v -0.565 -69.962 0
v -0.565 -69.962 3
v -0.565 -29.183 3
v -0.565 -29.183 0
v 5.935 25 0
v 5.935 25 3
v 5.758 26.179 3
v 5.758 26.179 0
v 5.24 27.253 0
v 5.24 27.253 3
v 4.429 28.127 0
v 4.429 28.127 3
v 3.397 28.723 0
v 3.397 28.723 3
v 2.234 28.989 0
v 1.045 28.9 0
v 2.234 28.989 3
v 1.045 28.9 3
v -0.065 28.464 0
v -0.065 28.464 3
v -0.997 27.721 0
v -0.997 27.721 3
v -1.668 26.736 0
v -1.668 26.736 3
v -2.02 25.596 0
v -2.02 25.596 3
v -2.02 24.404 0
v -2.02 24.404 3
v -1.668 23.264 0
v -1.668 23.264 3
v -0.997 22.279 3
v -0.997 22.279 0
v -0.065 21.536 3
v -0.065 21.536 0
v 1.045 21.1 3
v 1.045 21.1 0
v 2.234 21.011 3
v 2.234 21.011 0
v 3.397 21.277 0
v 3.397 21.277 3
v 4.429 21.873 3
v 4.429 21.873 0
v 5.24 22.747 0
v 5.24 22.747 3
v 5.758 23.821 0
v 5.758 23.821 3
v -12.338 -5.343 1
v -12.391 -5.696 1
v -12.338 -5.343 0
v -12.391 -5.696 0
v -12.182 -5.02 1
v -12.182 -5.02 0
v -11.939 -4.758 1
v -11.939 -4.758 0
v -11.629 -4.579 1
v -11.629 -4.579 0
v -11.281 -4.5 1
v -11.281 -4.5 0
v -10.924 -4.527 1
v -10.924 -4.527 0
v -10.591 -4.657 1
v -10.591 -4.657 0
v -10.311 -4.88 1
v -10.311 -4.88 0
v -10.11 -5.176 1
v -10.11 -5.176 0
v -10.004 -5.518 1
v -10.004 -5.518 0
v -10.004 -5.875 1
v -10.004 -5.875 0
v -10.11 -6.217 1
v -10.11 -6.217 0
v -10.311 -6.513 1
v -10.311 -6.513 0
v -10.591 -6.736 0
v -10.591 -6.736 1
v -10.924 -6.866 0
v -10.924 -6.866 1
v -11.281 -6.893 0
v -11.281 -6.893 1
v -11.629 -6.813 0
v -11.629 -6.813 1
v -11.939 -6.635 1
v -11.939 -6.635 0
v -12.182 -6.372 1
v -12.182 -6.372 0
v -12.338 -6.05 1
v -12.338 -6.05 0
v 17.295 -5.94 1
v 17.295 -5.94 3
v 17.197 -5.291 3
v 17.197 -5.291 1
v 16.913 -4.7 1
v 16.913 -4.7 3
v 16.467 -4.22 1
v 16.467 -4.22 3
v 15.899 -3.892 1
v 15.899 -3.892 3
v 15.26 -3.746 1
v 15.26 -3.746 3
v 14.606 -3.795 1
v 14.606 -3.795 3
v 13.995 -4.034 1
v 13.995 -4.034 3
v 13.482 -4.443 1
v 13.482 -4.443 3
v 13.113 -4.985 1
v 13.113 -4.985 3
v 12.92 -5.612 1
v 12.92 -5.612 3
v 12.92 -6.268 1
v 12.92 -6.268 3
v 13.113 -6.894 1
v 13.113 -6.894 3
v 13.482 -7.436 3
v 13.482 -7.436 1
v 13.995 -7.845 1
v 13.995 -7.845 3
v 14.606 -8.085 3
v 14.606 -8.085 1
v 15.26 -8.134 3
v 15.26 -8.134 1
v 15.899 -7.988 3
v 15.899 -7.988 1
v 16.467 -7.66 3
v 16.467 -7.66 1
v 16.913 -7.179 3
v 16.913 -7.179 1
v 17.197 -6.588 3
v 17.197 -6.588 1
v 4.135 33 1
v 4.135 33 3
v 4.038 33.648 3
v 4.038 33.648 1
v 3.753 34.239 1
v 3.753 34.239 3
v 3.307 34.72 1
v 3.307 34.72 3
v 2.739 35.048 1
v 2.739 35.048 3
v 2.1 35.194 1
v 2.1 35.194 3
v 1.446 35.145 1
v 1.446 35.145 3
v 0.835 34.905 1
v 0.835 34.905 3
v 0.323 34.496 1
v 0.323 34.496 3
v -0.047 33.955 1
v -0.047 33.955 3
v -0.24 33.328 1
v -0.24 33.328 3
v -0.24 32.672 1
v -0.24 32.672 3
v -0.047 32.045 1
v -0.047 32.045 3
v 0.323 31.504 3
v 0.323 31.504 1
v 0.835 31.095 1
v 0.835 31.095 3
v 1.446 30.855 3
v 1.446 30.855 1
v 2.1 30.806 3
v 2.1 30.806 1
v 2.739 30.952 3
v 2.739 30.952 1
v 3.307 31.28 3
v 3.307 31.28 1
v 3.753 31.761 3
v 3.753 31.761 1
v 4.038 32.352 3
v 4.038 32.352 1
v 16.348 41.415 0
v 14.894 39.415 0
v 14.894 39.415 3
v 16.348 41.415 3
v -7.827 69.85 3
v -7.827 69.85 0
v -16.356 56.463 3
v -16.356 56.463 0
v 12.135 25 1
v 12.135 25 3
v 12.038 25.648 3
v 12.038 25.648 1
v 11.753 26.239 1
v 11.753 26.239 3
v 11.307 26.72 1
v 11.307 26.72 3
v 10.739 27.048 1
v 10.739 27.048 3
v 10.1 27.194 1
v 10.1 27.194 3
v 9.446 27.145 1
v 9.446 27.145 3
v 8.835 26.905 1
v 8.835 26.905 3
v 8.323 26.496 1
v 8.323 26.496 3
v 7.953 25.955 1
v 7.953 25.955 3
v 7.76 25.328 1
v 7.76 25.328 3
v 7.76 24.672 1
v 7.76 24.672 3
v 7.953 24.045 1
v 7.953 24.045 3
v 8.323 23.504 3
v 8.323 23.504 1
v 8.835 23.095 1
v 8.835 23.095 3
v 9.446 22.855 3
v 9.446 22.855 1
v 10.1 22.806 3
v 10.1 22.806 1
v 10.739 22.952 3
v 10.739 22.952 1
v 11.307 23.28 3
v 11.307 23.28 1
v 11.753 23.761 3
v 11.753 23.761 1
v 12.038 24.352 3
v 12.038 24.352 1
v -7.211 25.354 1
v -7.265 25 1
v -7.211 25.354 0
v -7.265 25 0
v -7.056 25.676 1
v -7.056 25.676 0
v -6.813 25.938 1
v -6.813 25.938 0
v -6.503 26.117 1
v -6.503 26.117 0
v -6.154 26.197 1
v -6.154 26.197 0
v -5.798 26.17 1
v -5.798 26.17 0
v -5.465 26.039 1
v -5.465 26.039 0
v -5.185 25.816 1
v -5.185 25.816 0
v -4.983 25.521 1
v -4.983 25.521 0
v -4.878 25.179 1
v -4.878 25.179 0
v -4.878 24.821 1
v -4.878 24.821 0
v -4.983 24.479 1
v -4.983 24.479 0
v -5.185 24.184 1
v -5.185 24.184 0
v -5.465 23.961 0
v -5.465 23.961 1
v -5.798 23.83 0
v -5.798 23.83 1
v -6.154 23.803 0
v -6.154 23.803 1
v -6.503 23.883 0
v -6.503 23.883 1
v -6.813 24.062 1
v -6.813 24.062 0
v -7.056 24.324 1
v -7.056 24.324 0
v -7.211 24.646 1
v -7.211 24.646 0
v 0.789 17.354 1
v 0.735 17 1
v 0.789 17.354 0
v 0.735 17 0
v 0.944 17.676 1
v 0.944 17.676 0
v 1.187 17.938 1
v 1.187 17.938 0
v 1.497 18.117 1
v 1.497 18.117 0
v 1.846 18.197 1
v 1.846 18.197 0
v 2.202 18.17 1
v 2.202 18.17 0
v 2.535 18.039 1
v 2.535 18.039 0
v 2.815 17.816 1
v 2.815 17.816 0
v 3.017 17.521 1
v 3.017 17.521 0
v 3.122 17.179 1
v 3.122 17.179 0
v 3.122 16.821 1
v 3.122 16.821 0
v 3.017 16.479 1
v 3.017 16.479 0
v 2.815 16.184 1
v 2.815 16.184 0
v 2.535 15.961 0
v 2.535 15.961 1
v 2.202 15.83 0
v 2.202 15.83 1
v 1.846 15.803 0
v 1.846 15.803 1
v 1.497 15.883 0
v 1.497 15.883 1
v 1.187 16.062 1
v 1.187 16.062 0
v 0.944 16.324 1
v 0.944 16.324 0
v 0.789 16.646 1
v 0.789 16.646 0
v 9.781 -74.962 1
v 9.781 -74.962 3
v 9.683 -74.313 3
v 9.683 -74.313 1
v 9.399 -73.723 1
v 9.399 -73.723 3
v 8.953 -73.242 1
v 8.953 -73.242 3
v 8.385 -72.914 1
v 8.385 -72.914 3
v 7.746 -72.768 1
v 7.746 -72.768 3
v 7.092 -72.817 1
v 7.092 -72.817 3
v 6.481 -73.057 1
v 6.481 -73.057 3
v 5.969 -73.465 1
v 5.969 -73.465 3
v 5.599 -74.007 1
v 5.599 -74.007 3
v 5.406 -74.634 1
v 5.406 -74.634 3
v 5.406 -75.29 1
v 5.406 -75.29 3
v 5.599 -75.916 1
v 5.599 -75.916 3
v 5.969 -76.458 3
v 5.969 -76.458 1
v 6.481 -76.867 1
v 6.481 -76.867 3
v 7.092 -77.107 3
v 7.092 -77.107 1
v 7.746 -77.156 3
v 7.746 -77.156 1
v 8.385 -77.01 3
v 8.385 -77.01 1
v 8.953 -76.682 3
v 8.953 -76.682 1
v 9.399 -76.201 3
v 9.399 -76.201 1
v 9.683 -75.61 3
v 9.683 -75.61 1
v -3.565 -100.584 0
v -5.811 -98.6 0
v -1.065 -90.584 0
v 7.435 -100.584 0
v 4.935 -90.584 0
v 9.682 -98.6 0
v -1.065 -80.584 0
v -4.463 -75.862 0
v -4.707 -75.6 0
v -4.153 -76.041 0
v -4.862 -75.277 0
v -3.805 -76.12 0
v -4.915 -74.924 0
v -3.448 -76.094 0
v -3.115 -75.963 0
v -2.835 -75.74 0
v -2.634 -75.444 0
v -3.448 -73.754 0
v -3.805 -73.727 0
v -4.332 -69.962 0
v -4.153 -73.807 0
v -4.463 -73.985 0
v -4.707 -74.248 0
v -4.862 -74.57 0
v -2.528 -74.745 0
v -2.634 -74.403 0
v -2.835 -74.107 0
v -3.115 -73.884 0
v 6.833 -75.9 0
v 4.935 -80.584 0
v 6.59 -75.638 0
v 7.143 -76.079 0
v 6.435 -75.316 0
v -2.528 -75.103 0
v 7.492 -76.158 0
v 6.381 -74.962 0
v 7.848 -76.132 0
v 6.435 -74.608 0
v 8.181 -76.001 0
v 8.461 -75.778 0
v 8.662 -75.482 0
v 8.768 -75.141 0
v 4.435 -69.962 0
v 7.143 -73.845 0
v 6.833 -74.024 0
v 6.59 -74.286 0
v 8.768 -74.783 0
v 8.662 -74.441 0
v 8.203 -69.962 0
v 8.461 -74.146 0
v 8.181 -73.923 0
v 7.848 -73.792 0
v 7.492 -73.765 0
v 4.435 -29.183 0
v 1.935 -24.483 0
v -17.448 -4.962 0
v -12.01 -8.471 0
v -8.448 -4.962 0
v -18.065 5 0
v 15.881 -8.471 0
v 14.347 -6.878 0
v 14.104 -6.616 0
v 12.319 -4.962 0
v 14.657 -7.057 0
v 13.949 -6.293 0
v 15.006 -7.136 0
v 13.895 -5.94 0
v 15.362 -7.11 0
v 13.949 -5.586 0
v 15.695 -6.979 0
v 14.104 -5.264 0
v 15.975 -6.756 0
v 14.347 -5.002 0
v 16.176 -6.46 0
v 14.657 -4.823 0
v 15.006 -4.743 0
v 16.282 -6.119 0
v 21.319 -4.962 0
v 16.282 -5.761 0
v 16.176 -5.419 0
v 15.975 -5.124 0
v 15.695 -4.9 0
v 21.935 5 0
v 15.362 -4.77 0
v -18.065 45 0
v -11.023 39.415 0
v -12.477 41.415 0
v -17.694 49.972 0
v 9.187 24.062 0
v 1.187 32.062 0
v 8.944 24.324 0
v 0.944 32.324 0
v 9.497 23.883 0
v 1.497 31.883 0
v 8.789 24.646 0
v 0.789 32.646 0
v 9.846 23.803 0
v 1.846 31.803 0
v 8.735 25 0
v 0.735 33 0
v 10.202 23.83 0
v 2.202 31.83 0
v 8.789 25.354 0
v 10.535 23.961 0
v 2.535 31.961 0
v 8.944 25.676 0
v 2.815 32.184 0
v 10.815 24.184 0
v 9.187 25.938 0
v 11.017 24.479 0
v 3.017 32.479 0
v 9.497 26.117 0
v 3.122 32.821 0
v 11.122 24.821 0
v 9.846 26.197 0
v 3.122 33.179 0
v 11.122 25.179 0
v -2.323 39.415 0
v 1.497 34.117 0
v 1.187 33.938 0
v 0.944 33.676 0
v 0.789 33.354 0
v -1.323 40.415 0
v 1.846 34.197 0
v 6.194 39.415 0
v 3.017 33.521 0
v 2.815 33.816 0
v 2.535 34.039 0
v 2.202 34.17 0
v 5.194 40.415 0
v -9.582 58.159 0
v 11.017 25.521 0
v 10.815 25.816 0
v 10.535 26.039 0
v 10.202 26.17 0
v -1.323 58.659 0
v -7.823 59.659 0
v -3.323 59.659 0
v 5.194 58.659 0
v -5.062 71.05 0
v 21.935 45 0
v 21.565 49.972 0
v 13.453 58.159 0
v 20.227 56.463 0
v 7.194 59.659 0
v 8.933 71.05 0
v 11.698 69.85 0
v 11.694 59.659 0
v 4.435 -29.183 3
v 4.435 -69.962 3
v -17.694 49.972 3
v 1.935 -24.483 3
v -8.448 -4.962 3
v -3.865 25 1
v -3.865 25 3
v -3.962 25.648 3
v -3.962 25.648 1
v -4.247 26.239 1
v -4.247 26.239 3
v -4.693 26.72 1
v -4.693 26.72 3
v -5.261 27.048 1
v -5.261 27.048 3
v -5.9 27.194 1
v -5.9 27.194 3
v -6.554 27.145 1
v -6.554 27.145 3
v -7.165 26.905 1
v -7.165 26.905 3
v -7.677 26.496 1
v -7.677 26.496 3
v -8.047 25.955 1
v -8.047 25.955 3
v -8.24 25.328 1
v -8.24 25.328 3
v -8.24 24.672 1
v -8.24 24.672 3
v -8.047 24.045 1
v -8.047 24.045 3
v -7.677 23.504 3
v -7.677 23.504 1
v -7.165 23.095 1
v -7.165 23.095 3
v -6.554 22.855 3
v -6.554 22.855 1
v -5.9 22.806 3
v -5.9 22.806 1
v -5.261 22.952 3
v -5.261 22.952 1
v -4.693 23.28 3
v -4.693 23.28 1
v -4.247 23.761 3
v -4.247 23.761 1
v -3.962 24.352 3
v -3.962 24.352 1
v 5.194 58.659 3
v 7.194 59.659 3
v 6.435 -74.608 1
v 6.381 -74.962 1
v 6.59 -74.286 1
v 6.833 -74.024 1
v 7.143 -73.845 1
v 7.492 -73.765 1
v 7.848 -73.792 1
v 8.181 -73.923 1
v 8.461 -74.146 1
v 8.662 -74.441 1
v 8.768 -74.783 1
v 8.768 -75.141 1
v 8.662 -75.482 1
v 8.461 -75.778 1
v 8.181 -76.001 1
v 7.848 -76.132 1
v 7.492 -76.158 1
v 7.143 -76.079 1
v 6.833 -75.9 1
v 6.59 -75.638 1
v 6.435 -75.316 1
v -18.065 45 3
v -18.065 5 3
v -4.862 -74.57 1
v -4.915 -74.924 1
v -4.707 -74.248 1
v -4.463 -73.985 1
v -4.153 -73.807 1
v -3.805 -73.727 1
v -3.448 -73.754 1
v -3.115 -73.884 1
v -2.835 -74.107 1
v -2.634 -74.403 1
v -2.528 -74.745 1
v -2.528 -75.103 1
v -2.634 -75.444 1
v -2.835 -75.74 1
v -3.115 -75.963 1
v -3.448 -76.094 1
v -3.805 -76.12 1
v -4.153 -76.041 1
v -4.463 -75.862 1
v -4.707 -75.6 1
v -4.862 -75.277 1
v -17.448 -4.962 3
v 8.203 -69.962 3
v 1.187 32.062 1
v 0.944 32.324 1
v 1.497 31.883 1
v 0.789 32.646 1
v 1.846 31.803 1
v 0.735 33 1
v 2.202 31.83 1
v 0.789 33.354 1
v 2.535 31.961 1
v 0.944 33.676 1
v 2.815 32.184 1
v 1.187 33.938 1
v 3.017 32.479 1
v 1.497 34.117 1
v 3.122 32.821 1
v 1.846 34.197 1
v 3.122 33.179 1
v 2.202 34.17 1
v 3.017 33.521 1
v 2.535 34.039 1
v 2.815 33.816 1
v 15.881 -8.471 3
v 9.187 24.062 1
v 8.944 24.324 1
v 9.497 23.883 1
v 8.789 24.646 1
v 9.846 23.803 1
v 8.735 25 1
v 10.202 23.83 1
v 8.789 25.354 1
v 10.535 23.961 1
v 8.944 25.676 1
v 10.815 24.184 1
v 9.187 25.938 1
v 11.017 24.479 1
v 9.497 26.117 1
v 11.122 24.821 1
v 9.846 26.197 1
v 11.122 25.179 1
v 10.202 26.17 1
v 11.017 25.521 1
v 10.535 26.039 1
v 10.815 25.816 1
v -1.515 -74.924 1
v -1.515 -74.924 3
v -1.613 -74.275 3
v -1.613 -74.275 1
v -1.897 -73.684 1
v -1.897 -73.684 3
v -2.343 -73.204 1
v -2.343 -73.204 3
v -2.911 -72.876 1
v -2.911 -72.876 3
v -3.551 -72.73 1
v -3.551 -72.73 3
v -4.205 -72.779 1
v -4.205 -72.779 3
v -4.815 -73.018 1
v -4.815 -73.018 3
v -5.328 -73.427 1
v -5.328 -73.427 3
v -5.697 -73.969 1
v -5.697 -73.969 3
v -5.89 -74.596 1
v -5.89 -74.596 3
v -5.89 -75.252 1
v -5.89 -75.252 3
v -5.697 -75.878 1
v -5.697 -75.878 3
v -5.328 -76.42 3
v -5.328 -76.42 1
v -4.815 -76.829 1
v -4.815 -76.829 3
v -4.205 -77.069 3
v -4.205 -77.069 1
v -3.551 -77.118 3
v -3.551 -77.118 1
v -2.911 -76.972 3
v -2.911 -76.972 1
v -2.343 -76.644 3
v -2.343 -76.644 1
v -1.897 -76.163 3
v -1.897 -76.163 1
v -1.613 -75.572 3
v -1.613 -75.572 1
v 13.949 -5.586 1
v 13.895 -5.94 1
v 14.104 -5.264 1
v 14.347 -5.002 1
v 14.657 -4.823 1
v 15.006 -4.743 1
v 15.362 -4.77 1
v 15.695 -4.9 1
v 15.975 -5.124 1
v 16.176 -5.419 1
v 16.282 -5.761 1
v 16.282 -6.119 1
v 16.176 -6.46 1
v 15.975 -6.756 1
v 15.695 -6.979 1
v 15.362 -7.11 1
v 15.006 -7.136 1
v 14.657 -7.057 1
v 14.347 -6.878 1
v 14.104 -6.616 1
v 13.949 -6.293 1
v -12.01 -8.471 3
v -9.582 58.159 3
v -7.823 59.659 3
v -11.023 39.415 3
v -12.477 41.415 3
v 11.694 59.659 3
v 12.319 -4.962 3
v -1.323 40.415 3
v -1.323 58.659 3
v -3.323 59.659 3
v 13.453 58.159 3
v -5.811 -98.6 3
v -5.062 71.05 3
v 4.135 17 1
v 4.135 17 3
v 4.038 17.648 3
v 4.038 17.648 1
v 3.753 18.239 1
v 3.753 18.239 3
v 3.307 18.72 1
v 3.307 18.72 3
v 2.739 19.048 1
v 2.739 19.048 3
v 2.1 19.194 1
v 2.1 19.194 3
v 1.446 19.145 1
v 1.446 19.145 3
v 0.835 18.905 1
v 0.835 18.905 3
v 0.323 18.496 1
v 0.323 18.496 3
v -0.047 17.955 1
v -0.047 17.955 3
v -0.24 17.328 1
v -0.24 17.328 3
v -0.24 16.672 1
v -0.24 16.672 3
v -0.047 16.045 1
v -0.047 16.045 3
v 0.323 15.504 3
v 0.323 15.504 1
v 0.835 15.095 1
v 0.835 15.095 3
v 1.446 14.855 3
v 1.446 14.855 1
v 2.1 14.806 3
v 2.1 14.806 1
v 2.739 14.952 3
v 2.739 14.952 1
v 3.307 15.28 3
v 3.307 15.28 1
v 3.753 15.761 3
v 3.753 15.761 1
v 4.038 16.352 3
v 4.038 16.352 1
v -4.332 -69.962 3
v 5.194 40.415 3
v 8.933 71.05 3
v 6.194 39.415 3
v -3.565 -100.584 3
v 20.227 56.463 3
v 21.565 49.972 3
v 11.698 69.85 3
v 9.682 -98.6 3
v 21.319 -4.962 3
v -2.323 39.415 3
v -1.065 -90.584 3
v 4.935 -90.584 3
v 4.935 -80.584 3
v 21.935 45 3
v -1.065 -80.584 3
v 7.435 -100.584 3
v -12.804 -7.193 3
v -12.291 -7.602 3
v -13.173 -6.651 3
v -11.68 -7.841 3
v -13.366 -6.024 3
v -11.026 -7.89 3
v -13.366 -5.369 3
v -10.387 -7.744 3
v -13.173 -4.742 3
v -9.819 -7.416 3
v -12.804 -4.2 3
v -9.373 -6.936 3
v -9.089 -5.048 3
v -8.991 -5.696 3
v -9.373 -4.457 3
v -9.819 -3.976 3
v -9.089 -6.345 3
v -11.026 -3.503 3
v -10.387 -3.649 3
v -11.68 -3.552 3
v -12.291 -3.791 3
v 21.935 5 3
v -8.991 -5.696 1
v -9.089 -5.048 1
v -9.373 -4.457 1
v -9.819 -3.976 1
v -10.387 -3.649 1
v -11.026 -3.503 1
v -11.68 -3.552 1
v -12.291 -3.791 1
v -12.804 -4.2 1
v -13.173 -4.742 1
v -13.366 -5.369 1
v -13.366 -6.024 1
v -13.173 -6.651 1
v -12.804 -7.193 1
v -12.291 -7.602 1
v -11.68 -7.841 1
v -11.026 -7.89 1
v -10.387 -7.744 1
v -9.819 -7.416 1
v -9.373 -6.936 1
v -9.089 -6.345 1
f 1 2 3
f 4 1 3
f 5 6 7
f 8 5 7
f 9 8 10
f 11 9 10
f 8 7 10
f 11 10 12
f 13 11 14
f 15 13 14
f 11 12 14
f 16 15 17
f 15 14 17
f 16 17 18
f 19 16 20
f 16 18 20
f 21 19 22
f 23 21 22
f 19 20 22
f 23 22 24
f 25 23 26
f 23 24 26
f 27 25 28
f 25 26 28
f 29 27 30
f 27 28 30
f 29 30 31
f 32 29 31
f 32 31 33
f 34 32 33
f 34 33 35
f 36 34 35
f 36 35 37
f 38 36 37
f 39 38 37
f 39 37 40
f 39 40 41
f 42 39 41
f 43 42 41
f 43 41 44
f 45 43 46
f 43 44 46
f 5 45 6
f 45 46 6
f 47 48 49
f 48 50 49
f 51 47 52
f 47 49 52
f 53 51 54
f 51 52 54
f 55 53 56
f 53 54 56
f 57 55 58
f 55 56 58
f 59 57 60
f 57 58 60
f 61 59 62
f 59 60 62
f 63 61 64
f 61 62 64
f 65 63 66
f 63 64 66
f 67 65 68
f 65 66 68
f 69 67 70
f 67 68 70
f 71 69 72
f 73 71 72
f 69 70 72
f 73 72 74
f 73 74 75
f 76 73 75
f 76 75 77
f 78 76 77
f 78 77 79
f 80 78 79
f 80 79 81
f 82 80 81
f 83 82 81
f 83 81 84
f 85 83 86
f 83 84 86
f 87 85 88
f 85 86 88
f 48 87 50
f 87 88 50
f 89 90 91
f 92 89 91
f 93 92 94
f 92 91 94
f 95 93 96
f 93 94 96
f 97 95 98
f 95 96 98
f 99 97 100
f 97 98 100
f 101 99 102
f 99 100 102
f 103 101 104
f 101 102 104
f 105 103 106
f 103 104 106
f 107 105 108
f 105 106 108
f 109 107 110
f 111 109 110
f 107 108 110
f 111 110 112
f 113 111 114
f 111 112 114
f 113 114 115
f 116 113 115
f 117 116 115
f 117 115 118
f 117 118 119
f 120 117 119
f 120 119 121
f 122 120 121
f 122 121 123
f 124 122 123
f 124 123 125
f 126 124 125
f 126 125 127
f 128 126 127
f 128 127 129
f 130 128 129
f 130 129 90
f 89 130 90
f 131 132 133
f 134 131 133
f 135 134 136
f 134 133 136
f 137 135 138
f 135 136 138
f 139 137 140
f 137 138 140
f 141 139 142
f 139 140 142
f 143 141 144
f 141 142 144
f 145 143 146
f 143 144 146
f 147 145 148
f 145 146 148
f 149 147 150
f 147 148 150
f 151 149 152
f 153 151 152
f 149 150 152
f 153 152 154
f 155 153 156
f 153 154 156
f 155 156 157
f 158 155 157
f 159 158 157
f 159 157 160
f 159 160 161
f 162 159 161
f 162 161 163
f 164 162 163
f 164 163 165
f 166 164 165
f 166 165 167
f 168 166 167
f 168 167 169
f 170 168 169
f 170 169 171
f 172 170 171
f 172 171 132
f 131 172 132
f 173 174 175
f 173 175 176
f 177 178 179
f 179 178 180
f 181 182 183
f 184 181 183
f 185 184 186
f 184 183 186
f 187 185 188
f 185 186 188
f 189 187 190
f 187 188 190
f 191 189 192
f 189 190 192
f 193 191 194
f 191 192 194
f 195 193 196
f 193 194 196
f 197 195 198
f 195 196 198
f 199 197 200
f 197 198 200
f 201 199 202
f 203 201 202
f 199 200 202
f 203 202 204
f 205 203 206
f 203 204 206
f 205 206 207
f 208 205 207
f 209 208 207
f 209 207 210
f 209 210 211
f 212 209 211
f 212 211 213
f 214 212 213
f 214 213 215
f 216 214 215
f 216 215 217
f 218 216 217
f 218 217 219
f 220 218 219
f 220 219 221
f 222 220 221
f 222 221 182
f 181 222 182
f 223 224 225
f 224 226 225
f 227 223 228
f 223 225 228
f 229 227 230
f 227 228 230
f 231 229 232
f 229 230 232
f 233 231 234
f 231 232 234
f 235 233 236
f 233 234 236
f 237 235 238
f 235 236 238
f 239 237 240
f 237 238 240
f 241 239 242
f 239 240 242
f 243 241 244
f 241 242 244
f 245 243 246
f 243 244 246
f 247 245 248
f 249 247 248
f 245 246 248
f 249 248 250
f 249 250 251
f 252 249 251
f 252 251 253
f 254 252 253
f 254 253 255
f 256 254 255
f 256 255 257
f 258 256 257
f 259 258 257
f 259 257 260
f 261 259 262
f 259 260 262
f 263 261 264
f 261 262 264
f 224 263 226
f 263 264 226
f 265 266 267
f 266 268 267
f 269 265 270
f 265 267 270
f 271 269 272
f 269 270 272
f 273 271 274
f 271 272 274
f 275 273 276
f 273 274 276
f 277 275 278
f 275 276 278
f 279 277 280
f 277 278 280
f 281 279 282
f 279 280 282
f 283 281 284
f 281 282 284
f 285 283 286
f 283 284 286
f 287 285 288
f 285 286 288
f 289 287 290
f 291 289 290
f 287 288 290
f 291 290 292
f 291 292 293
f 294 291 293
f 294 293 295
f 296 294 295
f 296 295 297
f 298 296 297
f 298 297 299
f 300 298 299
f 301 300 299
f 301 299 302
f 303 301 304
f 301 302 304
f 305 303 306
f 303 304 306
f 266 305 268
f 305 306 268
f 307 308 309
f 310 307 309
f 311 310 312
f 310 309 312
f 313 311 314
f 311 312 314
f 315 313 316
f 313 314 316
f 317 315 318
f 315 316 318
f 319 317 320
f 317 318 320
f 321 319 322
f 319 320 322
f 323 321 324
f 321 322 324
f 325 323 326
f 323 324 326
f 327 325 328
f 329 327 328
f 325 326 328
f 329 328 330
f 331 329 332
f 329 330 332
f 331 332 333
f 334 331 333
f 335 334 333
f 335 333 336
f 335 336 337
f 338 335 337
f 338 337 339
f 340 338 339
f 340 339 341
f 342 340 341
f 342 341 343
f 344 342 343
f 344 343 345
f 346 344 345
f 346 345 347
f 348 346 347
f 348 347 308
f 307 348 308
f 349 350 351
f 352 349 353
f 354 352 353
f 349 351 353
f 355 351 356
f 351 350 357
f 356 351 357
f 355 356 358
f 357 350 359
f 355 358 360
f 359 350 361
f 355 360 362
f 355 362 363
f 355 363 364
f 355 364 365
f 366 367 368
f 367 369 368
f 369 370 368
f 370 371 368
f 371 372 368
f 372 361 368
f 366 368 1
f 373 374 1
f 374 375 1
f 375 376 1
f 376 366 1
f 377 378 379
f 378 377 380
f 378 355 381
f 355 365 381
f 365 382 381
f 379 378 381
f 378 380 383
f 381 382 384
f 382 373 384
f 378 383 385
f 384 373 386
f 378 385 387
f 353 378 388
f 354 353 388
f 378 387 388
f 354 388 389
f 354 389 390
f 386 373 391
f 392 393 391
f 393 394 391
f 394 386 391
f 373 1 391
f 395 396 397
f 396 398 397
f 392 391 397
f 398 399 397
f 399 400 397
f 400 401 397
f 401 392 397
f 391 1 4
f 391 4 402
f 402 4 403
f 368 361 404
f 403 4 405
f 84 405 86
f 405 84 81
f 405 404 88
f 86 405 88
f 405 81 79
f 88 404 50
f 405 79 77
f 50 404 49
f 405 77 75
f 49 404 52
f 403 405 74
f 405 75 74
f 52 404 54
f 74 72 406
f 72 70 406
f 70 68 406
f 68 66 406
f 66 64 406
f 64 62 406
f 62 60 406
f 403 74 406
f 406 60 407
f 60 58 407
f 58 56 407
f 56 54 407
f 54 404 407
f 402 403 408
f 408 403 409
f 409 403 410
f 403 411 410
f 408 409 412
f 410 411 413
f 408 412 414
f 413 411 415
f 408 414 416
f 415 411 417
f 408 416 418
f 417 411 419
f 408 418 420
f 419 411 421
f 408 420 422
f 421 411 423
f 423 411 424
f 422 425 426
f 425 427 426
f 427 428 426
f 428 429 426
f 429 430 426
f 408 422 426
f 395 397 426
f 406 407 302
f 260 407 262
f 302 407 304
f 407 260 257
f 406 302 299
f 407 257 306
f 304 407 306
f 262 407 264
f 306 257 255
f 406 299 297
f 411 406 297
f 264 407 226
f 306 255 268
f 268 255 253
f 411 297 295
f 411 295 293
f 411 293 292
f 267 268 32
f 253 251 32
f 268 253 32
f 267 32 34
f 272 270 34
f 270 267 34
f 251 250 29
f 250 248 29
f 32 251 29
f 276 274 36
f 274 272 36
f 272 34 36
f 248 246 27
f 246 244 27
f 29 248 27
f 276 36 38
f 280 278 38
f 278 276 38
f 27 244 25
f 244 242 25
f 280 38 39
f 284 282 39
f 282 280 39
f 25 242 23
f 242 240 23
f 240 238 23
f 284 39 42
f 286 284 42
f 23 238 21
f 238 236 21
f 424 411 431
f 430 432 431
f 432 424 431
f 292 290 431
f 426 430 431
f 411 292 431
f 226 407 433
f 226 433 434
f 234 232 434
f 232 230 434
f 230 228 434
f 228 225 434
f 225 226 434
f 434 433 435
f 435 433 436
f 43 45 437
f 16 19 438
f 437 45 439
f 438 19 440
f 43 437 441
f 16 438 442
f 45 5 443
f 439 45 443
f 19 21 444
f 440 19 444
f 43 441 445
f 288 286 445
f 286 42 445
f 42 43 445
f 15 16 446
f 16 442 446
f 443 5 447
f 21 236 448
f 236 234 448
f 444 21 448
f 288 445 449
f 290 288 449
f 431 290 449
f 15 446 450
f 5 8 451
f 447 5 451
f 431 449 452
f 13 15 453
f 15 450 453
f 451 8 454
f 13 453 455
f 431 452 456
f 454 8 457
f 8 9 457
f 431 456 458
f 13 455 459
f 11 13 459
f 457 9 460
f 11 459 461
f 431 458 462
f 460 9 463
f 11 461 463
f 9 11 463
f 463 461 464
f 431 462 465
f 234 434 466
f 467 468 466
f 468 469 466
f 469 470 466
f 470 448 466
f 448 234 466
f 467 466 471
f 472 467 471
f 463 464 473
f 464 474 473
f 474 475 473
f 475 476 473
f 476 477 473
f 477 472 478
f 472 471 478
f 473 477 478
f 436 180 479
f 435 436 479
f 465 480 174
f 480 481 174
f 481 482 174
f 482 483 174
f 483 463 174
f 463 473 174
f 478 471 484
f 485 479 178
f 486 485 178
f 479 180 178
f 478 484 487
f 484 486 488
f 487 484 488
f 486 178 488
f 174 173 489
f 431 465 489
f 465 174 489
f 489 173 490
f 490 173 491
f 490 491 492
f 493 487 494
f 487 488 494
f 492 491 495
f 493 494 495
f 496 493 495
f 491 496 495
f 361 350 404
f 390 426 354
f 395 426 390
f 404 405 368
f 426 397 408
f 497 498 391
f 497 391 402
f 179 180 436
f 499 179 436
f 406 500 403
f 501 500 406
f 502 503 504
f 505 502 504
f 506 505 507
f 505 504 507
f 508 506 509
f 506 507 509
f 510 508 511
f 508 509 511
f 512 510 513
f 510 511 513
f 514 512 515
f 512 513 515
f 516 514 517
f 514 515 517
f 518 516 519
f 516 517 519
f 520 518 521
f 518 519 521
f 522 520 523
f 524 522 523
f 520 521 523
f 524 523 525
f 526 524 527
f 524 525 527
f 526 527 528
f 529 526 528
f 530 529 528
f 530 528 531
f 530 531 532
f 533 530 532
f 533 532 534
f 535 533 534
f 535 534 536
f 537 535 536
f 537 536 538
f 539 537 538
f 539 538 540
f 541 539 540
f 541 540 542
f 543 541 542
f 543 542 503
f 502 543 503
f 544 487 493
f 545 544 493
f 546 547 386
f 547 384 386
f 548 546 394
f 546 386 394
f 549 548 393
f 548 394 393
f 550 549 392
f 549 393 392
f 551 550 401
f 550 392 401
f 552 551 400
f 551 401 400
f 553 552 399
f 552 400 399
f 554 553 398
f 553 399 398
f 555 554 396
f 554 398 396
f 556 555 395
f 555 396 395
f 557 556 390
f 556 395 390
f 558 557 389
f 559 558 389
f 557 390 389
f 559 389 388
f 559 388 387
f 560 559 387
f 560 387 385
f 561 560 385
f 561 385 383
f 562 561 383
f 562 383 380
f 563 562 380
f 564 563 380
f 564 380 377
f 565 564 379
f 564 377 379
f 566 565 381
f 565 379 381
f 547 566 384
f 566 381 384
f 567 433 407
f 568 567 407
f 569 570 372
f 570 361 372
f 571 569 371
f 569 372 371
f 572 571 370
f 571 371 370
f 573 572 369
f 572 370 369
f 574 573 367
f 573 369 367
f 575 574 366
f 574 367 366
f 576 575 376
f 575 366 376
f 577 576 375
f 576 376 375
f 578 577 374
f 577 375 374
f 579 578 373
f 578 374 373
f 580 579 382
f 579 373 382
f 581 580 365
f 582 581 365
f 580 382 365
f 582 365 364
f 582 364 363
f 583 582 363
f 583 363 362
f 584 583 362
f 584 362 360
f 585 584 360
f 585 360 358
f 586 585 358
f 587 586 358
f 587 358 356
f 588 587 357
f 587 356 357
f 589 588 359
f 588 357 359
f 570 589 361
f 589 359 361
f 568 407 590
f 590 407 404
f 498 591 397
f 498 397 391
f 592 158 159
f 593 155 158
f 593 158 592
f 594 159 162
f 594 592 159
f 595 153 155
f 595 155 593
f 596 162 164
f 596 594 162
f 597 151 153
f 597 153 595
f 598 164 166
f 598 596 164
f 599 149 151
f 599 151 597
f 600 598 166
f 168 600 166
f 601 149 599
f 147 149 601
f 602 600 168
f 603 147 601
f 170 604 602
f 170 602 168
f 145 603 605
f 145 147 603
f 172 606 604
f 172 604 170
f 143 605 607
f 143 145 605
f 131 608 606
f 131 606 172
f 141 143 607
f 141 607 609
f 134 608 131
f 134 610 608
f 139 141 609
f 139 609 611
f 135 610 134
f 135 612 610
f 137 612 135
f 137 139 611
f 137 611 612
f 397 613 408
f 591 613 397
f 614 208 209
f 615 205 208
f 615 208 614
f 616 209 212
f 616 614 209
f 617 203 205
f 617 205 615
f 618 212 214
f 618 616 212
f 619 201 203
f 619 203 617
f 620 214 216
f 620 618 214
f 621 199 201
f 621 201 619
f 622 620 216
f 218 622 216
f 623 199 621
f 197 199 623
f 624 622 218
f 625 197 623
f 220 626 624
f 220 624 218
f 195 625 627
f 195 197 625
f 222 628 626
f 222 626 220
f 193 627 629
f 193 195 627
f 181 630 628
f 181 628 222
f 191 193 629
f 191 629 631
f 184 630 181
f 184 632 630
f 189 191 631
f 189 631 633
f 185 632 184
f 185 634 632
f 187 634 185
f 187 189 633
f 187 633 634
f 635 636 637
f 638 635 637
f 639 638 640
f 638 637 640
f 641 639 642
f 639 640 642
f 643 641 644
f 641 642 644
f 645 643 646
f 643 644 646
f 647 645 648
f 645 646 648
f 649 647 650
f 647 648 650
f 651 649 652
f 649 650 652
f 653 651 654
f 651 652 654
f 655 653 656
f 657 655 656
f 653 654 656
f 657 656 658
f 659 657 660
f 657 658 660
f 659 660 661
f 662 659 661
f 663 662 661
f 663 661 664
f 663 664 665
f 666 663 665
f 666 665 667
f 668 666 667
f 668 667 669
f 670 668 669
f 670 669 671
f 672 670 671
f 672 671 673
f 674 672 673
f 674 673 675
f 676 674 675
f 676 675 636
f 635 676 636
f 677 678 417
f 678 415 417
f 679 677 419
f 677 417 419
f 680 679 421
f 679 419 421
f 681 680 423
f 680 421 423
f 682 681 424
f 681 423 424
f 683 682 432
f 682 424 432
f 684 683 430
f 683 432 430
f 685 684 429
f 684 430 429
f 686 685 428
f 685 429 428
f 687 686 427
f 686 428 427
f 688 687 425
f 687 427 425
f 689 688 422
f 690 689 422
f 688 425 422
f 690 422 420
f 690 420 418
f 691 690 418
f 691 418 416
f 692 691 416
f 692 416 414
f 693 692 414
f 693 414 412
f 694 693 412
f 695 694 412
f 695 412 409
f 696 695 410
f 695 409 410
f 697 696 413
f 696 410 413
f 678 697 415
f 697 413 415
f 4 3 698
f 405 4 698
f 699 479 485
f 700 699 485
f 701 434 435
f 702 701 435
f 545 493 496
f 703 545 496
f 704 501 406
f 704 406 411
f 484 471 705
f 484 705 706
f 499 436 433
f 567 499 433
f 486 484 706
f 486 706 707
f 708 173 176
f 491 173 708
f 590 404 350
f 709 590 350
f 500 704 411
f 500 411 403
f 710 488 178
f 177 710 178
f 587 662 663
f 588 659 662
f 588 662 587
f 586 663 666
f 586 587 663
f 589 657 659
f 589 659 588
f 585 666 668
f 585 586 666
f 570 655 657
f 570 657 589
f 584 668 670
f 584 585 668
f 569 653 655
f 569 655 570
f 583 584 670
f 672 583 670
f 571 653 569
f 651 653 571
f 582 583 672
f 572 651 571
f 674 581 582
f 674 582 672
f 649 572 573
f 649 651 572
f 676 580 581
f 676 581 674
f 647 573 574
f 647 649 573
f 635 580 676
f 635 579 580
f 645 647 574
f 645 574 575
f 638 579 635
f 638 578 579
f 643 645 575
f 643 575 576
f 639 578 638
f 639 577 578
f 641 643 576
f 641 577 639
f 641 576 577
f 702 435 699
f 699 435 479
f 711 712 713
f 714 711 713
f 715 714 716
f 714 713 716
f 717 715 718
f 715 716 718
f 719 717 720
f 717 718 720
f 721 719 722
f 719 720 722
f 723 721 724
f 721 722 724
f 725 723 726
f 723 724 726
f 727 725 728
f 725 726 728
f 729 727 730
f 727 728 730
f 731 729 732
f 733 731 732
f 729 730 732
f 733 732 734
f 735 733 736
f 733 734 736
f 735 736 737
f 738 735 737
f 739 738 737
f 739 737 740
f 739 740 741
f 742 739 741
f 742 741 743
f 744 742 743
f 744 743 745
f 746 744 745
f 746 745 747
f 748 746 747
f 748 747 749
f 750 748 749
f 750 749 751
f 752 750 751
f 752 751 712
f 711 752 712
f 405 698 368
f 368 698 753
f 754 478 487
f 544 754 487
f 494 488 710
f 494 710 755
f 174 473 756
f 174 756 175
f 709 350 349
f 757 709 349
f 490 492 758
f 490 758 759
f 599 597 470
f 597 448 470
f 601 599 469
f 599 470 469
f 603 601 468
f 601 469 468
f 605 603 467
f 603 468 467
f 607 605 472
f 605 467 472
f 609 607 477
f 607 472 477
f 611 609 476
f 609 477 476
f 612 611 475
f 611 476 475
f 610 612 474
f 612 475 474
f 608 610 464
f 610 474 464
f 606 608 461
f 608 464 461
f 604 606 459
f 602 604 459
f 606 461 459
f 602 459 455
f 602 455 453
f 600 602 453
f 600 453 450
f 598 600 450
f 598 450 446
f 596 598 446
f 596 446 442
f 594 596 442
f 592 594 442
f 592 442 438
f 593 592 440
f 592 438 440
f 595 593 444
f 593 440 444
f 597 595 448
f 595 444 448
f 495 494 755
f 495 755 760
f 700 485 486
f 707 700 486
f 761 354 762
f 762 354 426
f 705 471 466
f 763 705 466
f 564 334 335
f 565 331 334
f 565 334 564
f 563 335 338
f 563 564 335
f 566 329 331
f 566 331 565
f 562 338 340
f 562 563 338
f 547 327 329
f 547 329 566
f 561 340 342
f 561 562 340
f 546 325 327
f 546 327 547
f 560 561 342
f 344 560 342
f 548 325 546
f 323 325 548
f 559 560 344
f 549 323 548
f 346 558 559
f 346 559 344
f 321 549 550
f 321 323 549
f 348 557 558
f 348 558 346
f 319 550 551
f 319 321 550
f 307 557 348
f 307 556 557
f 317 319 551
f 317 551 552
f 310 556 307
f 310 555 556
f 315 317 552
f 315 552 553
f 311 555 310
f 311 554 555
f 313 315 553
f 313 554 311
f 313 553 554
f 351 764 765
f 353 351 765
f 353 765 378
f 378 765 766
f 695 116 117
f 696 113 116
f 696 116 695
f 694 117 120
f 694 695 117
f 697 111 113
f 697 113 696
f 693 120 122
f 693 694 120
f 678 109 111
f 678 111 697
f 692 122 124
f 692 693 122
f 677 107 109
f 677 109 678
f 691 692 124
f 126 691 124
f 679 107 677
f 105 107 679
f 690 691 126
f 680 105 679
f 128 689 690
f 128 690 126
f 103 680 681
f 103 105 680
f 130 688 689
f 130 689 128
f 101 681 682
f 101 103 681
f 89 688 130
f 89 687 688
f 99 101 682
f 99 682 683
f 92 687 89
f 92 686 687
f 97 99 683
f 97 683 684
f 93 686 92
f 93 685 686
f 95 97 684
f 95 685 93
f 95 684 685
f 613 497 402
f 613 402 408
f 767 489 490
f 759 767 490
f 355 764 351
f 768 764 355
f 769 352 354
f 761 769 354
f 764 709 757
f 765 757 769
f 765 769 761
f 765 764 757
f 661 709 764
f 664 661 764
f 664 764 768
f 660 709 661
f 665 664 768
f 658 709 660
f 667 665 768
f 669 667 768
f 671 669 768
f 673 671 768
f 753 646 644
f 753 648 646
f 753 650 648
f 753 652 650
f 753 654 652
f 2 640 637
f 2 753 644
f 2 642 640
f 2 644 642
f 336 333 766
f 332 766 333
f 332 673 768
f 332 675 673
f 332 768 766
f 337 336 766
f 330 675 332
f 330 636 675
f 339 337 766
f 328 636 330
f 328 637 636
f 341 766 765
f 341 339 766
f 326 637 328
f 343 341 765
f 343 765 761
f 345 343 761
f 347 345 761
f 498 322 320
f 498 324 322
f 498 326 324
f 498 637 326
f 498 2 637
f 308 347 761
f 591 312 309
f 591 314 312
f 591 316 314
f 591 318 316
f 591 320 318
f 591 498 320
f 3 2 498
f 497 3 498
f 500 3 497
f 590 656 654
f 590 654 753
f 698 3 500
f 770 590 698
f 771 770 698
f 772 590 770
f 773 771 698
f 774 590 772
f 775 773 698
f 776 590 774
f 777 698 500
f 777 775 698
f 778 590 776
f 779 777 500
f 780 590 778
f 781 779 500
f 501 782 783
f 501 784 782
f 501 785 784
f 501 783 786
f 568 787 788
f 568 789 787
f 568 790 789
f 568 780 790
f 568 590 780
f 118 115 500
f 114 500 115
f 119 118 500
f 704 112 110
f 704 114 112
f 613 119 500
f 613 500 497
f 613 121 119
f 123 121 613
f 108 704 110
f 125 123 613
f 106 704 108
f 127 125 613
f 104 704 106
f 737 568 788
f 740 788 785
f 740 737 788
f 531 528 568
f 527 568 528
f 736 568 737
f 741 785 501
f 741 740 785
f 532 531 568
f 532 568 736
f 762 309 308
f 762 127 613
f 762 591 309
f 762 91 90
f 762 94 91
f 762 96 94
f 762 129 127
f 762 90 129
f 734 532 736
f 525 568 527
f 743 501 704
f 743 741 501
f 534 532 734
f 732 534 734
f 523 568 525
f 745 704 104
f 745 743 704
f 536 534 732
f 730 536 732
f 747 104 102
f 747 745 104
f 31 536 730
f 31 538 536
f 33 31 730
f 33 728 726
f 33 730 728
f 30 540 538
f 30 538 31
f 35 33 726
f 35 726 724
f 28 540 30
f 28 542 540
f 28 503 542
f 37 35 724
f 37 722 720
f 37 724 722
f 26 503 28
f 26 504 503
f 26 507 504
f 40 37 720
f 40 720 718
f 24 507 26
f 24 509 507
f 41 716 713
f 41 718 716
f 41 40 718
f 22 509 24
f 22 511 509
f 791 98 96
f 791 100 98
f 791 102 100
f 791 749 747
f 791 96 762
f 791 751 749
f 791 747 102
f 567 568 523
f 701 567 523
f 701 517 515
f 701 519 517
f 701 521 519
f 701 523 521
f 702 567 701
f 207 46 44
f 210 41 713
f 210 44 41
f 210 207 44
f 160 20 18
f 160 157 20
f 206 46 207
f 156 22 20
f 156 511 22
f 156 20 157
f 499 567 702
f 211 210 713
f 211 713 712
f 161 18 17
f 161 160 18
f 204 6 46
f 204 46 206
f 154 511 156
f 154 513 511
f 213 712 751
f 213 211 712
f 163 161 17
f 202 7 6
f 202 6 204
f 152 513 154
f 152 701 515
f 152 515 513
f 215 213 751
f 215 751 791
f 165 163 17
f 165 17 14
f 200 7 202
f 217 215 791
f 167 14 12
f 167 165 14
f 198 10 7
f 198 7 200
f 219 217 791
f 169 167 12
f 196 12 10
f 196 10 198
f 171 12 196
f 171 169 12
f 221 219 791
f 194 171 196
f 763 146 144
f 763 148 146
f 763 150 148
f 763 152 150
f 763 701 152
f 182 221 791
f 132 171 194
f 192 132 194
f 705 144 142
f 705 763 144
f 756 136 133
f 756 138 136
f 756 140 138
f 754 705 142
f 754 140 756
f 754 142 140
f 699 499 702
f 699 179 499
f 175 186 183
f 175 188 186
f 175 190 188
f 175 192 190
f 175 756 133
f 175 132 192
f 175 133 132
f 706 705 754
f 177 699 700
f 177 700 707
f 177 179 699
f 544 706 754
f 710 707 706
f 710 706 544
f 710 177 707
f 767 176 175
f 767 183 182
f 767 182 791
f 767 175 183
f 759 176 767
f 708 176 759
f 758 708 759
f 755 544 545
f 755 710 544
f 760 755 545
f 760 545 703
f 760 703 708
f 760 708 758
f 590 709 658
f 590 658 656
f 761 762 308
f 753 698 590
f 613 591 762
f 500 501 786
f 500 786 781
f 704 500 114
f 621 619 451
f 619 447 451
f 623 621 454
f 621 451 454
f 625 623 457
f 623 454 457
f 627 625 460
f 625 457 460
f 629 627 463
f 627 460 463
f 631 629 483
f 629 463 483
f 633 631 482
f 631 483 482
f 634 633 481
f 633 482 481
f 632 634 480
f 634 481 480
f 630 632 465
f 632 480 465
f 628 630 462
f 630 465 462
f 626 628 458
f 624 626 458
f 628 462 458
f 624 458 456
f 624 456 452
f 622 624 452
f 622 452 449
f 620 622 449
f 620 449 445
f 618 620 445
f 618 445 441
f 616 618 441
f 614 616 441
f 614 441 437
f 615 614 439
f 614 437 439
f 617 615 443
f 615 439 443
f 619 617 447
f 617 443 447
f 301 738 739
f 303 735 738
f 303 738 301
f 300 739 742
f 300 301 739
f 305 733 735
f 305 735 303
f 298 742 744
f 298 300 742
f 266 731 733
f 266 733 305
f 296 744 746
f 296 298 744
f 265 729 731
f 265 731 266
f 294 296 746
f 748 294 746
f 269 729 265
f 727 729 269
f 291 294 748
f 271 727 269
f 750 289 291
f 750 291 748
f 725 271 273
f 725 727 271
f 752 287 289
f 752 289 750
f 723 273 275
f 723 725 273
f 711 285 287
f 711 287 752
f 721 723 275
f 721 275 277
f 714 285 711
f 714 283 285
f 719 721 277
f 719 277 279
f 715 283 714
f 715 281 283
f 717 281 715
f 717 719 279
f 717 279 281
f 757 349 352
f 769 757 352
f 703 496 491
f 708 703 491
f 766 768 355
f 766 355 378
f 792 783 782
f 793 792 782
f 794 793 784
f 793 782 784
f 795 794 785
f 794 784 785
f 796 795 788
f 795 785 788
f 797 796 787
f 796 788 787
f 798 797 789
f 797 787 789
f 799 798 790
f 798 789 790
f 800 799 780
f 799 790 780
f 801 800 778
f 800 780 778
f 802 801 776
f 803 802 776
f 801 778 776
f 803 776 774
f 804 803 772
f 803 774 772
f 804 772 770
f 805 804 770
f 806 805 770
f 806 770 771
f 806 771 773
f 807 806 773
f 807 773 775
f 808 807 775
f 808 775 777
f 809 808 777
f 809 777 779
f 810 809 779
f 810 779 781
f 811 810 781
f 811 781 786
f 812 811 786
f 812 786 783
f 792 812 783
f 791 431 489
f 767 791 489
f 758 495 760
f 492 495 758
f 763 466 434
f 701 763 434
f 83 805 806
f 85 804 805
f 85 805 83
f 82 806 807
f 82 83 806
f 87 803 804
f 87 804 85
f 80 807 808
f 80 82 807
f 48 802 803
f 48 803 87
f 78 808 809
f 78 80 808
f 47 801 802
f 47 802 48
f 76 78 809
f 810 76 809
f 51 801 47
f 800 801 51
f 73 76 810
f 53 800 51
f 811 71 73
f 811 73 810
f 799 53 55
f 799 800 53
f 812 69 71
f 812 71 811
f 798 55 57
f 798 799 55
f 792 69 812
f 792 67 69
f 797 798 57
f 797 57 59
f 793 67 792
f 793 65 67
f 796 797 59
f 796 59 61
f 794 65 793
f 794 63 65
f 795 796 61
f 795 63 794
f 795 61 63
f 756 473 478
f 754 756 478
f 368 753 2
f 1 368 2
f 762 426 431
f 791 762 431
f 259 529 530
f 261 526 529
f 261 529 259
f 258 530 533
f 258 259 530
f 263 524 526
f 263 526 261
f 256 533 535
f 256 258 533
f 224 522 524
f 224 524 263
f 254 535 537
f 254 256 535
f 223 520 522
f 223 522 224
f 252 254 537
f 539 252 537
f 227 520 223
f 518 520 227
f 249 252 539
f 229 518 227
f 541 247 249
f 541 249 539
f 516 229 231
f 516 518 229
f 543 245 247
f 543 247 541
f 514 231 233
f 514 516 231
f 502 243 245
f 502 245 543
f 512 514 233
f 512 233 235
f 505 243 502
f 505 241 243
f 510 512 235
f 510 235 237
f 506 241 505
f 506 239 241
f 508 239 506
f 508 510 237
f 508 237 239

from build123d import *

# Parameters (mm, degrees)
BOSS_EXTRUDE1_DEPTH            = 3
SKETCH3_R                      = 4
CUT_EXTRUDE1_DEPTH             = 3
CBORE_FOR_M2_SHCS1_D           = 2.4
CBORE_FOR_M2_SHCS1_DEPTH       = 3
CBORE_FOR_M2_SHCS1_CBORE_D     = 4.4
CBORE_FOR_M2_SHCS1_CBORE_DEPTH = 2
CBORE_FOR_M2_SHCS1_TIP         = 0.721032743
CUT_EXTRUDE2_DEPTH             = 3
SKETCH7_W                      = 6
SKETCH7_H                      = 10
CUT_EXTRUDE3_DEPTH             = 3
CUT_EXTRUDE4_DEPTH             = 3
CBORE_FOR_M2_SHCS2_D           = 2.4
CBORE_FOR_M2_SHCS2_DEPTH       = 3
CBORE_FOR_M2_SHCS2_CBORE_D     = 4.4
CBORE_FOR_M2_SHCS2_CBORE_DEPTH = 2
CBORE_FOR_M2_SHCS2_TIP         = 0.721032743
SALIENTE_EXTRUIR2_DEPTH        = 3
CORTAR_EXTRUIR2_DEPTH          = 25
CORTAR_EXTRUIR3_DEPTH          = 8
CORTAR_EXTRUIR3_DEPTH_BACK     = 1
SALIENTE_EXTRUIR3_DEPTH        = 3
CORTAR_EXTRUIR4_DEPTH          = 32
CORTAR_EXTRUIR4_DEPTH_BACK     = 3
CORTAR_EXTRUIR5_DEPTH          = 33
CORTAR_EXTRUIR5_DEPTH_BACK     = 16
CORTAR_EXTRUIR6_DEPTH          = 36
CORTAR_EXTRUIR6_DEPTH_BACK     = 57
CROQUIS10_W                    = 8
CROQUIS10_H                    = 20.24327749
CROQUIS11_W                    = 22.516217108
CROQUIS11_H                    = 6.585791746
SALIENTE_EXTRUIR4_DEPTH        = 3
CORTAR_EXTRUIR7_DEPTH          = 12
CORTAR_EXTRUIR7_DEPTH_BACK     = 26
CORTAR_EXTRUIR8_DEPTH          = 37
CORTAR_EXTRUIR8_DEPTH_BACK     = 23
CORTAR_EXTRUIR10_DEPTH         = 10
CORTAR_EXTRUIR10_DEPTH_BACK    = 13
CROQUIS14_W                    = 22.056135014
CROQUIS14_H                    = 3.895510455
CORTAR_EXTRUIR11_DEPTH         = 15
CORTAR_EXTRUIR11_DEPTH_BACK    = 12
CROQUIS15_W                    = 4.816352665
CROQUIS15_H                    = 5.664480242
CORTAR_EXTRUIR12_DEPTH         = 33
CORTAR_EXTRUIR12_DEPTH_BACK    = 21
CORTAR_EXTRUIR18_DEPTH         = 52
CORTAR_EXTRUIR18_DEPTH_BACK    = 75
CORTAR_EXTRUIR19_DEPTH         = 24
CORTAR_EXTRUIR19_DEPTH_BACK    = 67
CORTAR_EXTRUIR20_DEPTH         = 39
CORTAR_EXTRUIR20_DEPTH_BACK    = 62
SALIENTE_EXTRUIR7_DEPTH        = 3
SALIENTE_EXTRUIR9_DEPTH        = 3
SALIENTE_EXTRUIR10_DEPTH       = 3


with BuildPart() as part:
    # Sketch2 → Boss-Extrude1 (new body)
    with BuildSketch(Plane.XY):
        Polygon((-5.811176978, -98.599598559), (-3.564526654, -100.58433119), (7.435473346, -100.58433119), (9.68212367, -98.599598559), (21.318847535, -4.961831578), (21.935473346, 5), (21.935473346, 45), (21.193771081, 54.944681764), (15.17717561, 95.055318236), (9.435473346, 100), (-5.564526654, 100), (-11.306228919, 95.055318236), (-17.32282439, 54.944681764), (-18.064526654, 45), (-18.064526654, 5), (-17.447900844, -4.961831578), align=None)
    extrude(amount=BOSS_EXTRUDE1_DEPTH)

    # Sketch3 → Cut-Extrude1 (cut)
    with BuildSketch(Plane.XY.offset(3)):
        with Locations((1.935473346, 25)):
            Circle(SKETCH3_R)
    extrude(amount=-CUT_EXTRUDE1_DEPTH, mode=Mode.SUBTRACT)

    # CBORE for M2 SHCS1
    with Locations(Plane.XY.offset(3)):
        with Locations((1.935473346, 33), (9.935473346, 25), (1.935473346, 17), (-6.064526654, 25)):
            CounterBoreHole(CBORE_FOR_M2_SHCS1_D / 2, CBORE_FOR_M2_SHCS1_CBORE_D / 2, CBORE_FOR_M2_SHCS1_CBORE_DEPTH, depth=CBORE_FOR_M2_SHCS1_DEPTH)
            with Locations((0, 0, -(CBORE_FOR_M2_SHCS1_DEPTH + CBORE_FOR_M2_SHCS1_TIP / 2))):  # 118° drill point
                Cone(0, CBORE_FOR_M2_SHCS1_D / 2, CBORE_FOR_M2_SHCS1_TIP, mode=Mode.SUBTRACT)

    # Sketch6 → Cut-Extrude2 (cut)
    with BuildSketch(Plane.XY.offset(3)):
        Polygon((-10.32282439, 54.944681764), (-2.592495206, 54.944681764), (-0.592495206, 56.944681764), (-0.592495206, 77.986977382), (-2.570367912, 80.283658288), (-6.413140682, 80.860074204), (-8.687694294, 79.178882404), (-12.026143484, 56.92255447), align=None)
        Polygon((15.841153071, 56.92255447), (12.502703881, 79.178882404), (10.22815027, 80.860074204), (6.385377499, 80.283658288), (4.407504794, 77.986977382), (4.407504794, 56.944681764), (6.407504794, 54.944681764), (14.137833977, 54.944681764), align=None)
        Polygon((-4.417484259, 94.313615971), (8.232493846, 94.313615971), (10.529174752, 92.335743265), (11.167639805, 88.07930958), (9.486448005, 85.804755968), (1.907504794, 84.667914487), (-5.671438417, 85.804755968), (-7.352630217, 88.07930958), (-6.714165164, 92.335743265), align=None)
    extrude(amount=-CUT_EXTRUDE2_DEPTH, mode=Mode.SUBTRACT)

    # Sketch7 → Cut-Extrude3 (cut)
    with BuildSketch(Plane.XY.offset(3)):
        with Locations((1.935473346, -85.58433119)):
            Rectangle(SKETCH7_W, SKETCH7_H)
    extrude(amount=-CUT_EXTRUDE3_DEPTH, mode=Mode.SUBTRACT)

    # Sketch8 → Cut-Extrude4 (cut)
    with BuildSketch(Plane.XY.offset(3)):
        Polygon((-8.447900844, -4.961831578), (12.318847535, -4.961831578), (1.935473346, -24.483157151), align=None)
        Polygon((15.880690917, -8.470858754), (8.202586605, -69.961831578), (4.435473346, -69.961831578), (4.435473346, -29.183297302), align=None)
        Polygon((-12.009744226, -8.470858754), (-4.331639914, -69.961831578), (-0.564526654, -69.961831578), (-0.564526654, -29.183297302), align=None)
    extrude(amount=-CUT_EXTRUDE4_DEPTH, mode=Mode.SUBTRACT)

    # CBORE for M2 SHCS2
    with Locations(Plane.XY.offset(3)):
        with Locations((-3.715014103, -74.923663156), (7.581217459, -74.961831578), (-11.190875883, -5.696432584), (15.095204577, -5.939721308), (1.907504794, 81.167914487)):
            CounterBoreHole(CBORE_FOR_M2_SHCS2_D / 2, CBORE_FOR_M2_SHCS2_CBORE_D / 2, CBORE_FOR_M2_SHCS2_CBORE_DEPTH, depth=CBORE_FOR_M2_SHCS2_DEPTH)
            with Locations((0, 0, -(CBORE_FOR_M2_SHCS2_DEPTH + CBORE_FOR_M2_SHCS2_TIP / 2))):  # 118° drill point
                Cone(0, CBORE_FOR_M2_SHCS2_D / 2, CBORE_FOR_M2_SHCS2_TIP, mode=Mode.SUBTRACT)

    # Croquis2 → Saliente-Extruir2 (add)
    with BuildSketch(Plane.XY):
        Polygon((18.794620774, 54.944681764), (-14.944396603, 54.944681764), (-7.478946257, 96.267482636), (12.143583194, 96.267482636), align=None)
    extrude(amount=SALIENTE_EXTRUIR2_DEPTH)

    # Croquis3 → Cortar-Extruir2 (cut)
    with BuildSketch(Plane.XY):
        Polygon((3.935473346, 75), (15.193771081, 54.944681764), (9.17717561, 95.055318236), (3.935473346, 95.055318236), align=None)
        Polygon((-5.306228919, 95.055318236), (-11.32282439, 54.944681764), (-0.064526654, 75), (-0.064526654, 95.055318236), align=None)
        Polygon((1.935473346, 67.392726007), (10.193771081, 54.944681764), (-6.32282439, 54.944681764), align=None)
    extrude(amount=CORTAR_EXTRUIR2_DEPTH, mode=Mode.SUBTRACT)

    # Croquis4 → Cortar-Extruir3 (cut, two sides: drawn at the far end of the back side and taken through both)
    with BuildSketch(Plane.XY.offset(-CORTAR_EXTRUIR3_DEPTH_BACK)):
        Polygon((-16.681169013, 74.945942972), (0, 74.945942972), (20.337076697, 74.945942972), (20.337076697, 106.026068233), (-16.681169013, 106.026068233), align=None)
    extrude(amount=CORTAR_EXTRUIR3_DEPTH + CORTAR_EXTRUIR3_DEPTH_BACK, mode=Mode.SUBTRACT)

    # Croquis5 → Saliente-Extruir3 (add)
    with BuildSketch(Plane.XY):
        Polygon((-14.322635208, 74.945942972), (18.1935819, 74.945942972), (18.1935819, 53.950721804), (-16.161111671, 53.950721804), align=None)
    extrude(amount=SALIENTE_EXTRUIR3_DEPTH)

    # Croquis8 → Cortar-Extruir4 (cut, two sides: drawn at the far end of the back side and taken through both)
    with BuildSketch(Plane.XY.offset(-CORTAR_EXTRUIR4_DEPTH_BACK)):
        Polygon((-14.322635208, 74.945942972), (-15.372635208, 67.945942972), (-9.322635208, 74.945942972), align=None)
        Polygon((18.1935819, 74.945942972), (13.1935819, 74.945942972), (19.2435819, 67.945942972), align=None)
    extrude(amount=CORTAR_EXTRUIR4_DEPTH + CORTAR_EXTRUIR4_DEPTH_BACK, mode=Mode.SUBTRACT)

    # Croquis9 → Cortar-Extruir5 (cut, two sides: drawn at the far end of the back side and taken through both)
    with BuildSketch(Plane.XY.offset(-CORTAR_EXTRUIR5_DEPTH_BACK)):
        Polygon((-9.322635208, 67.945942972), (-9.322635208, 70.912384295), (13.1935819, 70.912384295), (13.1935819, 67.945942972), (13.1935819, 64.326592549), (-9.322635208, 64.326592549), align=None)
    extrude(amount=CORTAR_EXTRUIR5_DEPTH + CORTAR_EXTRUIR5_DEPTH_BACK, mode=Mode.SUBTRACT)

    # Croquis10 → Cortar-Extruir6 (cut, two sides: drawn at the far end of the back side and taken through both)
    with BuildSketch(Plane.XY.offset(-CORTAR_EXTRUIR6_DEPTH_BACK)):
        with Locations((-5.322635208, 49.537038019)):
            Rectangle(CROQUIS10_W, CROQUIS10_H)
        with Locations((9.1935819, 49.537038019)):
            Rectangle(CROQUIS10_W, CROQUIS10_H)
    extrude(amount=CORTAR_EXTRUIR6_DEPTH + CORTAR_EXTRUIR6_DEPTH_BACK, mode=Mode.SUBTRACT)

    # Croquis11 → Saliente-Extruir4 (add)
    with BuildSketch(Plane.XY):
        with Locations((1.935473346, 67.619488422)):
            Rectangle(CROQUIS11_W, CROQUIS11_H)
    extrude(amount=SALIENTE_EXTRUIR4_DEPTH)

    # Croquis12 → Cortar-Extruir7 (cut, two sides: drawn at the far end of the back side and taken through both)
    with BuildSketch(Plane.XY.offset(-CORTAR_EXTRUIR7_DEPTH_BACK)):
        Polygon((-15.372635208, 67.945942972), (-9.322635208, 74.945942972), (-5.822635208, 74.945942972), (-17.32282439, 54.944681764), align=None)
    extrude(amount=CORTAR_EXTRUIR7_DEPTH + CORTAR_EXTRUIR7_DEPTH_BACK, mode=Mode.SUBTRACT)

    # Croquis13 → Cortar-Extruir8 (cut, two sides: drawn at the far end of the back side and taken through both)
    with BuildSketch(Plane.XY.offset(-CORTAR_EXTRUIR8_DEPTH_BACK)):
        Polygon((13.1935819, 74.945942972), (9.6935819, 74.945942972), (21.193771081, 54.944681764), (19.2435819, 67.945942972), align=None)
    extrude(amount=CORTAR_EXTRUIR8_DEPTH + CORTAR_EXTRUIR8_DEPTH_BACK, mode=Mode.SUBTRACT)

    # Croquis14 → Cortar-Extruir10 (cut, two sides: drawn at the far end of the back side and taken through both)
    with BuildSketch(Plane.XY.offset(-CORTAR_EXTRUIR10_DEPTH_BACK)):
        with Locations((5.205432299, 72.998187745)):
            Rectangle(CROQUIS14_W, CROQUIS14_H)
    extrude(amount=CORTAR_EXTRUIR10_DEPTH + CORTAR_EXTRUIR10_DEPTH_BACK, mode=Mode.SUBTRACT)

    # Croquis15 → Cortar-Extruir11 (cut, two sides: drawn at the far end of the back side and taken through both)
    with BuildSketch(Plane.XY.offset(-CORTAR_EXTRUIR11_DEPTH_BACK)):
        with Locations((-8.230811541, 73.882672638)):
            Rectangle(CROQUIS15_W, CROQUIS15_H)
    extrude(amount=CORTAR_EXTRUIR11_DEPTH + CORTAR_EXTRUIR11_DEPTH_BACK, mode=Mode.SUBTRACT)

    # Croquis16 → Cortar-Extruir12 (cut, two sides: drawn at the far end of the back side and taken through both)
    with BuildSketch(Plane.XY.offset(-CORTAR_EXTRUIR12_DEPTH_BACK)):
        Polygon((-8.062449324, 71.050432517), (-7.062449324, 71.050432517), (-17.32282439, 54.944681764), align=None)
        Polygon((11.933396016, 71.050432517), (10.933396016, 71.050432517), (21.193771081, 54.944681764), align=None)
    extrude(amount=CORTAR_EXTRUIR12_DEPTH + CORTAR_EXTRUIR12_DEPTH_BACK, mode=Mode.SUBTRACT)

    # Croquis18 → Cortar-Extruir18 (cut, two sides: drawn at the far end of the back side and taken through both)
    with BuildSketch(Plane.XY.offset(-CORTAR_EXTRUIR18_DEPTH_BACK)):
        Polygon((-7.062449324, 71.050432517), (-5.062449324, 71.050432517), (-7.826924714, 69.850432517), align=None)
        Polygon((10.933396016, 71.050432517), (8.933396016, 71.050432517), (11.697871405, 69.850432517), align=None)
    extrude(amount=CORTAR_EXTRUIR18_DEPTH + CORTAR_EXTRUIR18_DEPTH_BACK, mode=Mode.SUBTRACT)

    # Croquis20 → Cortar-Extruir19 (cut, two sides: drawn at the far end of the back side and taken through both)
    with BuildSketch(Plane.XY.offset(-CORTAR_EXTRUIR19_DEPTH_BACK)):
        Polygon((21.193771081, 54.944681764), (20.226639816, 56.462791483), (21.564622213, 49.972340882), align=None)
        Polygon((-17.32282439, 54.944681764), (-16.355693125, 56.462791483), (-17.693675522, 49.972340882), align=None)
    extrude(amount=CORTAR_EXTRUIR19_DEPTH + CORTAR_EXTRUIR19_DEPTH_BACK, mode=Mode.SUBTRACT)

    # Croquis21 → Cortar-Extruir20 (cut, two sides: drawn at the far end of the back side and taken through both)
    with BuildSketch(Plane.XY.offset(-CORTAR_EXTRUIR20_DEPTH_BACK)):
        Polygon((-9.322635208, 39.415399274), (-12.822635208, 39.415399274), (-9.322635208, 59.658676764), align=None)
        Polygon((13.1935819, 39.415399274), (16.6935819, 39.415399274), (13.1935819, 59.658676764), align=None)
    extrude(amount=CORTAR_EXTRUIR20_DEPTH + CORTAR_EXTRUIR20_DEPTH_BACK, mode=Mode.SUBTRACT)

    # Croquis23 → Saliente-Extruir7 (add)
    with BuildSketch(Plane.XY):
        Polygon((-9.322635208, 59.658676764), (-9.581980564, 58.158676764), (-7.822635208, 59.658676764), align=None)
        Polygon((13.1935819, 59.658676764), (11.6935819, 59.658676764), (13.452927256, 58.158676764), align=None)
    extrude(amount=SALIENTE_EXTRUIR7_DEPTH)

    # Croquis24 → Saliente-Extruir9 (add)
    with BuildSketch(Plane.XY):
        Polygon((-12.822635208, 39.415399274), (-11.022635208, 39.415399274), (-12.476841401, 41.415399274), align=None)
        Polygon((-1.322635208, 39.415399274), (-1.322635208, 40.415399274), (-2.322635208, 39.415399274), align=None)
        Polygon((5.1935819, 39.415399274), (6.1935819, 39.415399274), (5.1935819, 40.415399274), align=None)
        Polygon((14.8935819, 39.415399274), (16.347788092, 41.415399274), (16.6935819, 39.415399274), align=None)
    extrude(amount=SALIENTE_EXTRUIR9_DEPTH)

    # Croquis25 → Saliente-Extruir10 (add)
    with BuildSketch(Plane.XY):
        Polygon((5.1935819, 59.658676764), (5.1935819, 58.658676764), (7.1935819, 59.658676764), align=None)
        Polygon((-1.322635208, 58.658676764), (-3.322635208, 59.658676764), (-1.322635208, 59.658676764), align=None)
    extrude(amount=SALIENTE_EXTRUIR10_DEPTH)


solid = part.part
